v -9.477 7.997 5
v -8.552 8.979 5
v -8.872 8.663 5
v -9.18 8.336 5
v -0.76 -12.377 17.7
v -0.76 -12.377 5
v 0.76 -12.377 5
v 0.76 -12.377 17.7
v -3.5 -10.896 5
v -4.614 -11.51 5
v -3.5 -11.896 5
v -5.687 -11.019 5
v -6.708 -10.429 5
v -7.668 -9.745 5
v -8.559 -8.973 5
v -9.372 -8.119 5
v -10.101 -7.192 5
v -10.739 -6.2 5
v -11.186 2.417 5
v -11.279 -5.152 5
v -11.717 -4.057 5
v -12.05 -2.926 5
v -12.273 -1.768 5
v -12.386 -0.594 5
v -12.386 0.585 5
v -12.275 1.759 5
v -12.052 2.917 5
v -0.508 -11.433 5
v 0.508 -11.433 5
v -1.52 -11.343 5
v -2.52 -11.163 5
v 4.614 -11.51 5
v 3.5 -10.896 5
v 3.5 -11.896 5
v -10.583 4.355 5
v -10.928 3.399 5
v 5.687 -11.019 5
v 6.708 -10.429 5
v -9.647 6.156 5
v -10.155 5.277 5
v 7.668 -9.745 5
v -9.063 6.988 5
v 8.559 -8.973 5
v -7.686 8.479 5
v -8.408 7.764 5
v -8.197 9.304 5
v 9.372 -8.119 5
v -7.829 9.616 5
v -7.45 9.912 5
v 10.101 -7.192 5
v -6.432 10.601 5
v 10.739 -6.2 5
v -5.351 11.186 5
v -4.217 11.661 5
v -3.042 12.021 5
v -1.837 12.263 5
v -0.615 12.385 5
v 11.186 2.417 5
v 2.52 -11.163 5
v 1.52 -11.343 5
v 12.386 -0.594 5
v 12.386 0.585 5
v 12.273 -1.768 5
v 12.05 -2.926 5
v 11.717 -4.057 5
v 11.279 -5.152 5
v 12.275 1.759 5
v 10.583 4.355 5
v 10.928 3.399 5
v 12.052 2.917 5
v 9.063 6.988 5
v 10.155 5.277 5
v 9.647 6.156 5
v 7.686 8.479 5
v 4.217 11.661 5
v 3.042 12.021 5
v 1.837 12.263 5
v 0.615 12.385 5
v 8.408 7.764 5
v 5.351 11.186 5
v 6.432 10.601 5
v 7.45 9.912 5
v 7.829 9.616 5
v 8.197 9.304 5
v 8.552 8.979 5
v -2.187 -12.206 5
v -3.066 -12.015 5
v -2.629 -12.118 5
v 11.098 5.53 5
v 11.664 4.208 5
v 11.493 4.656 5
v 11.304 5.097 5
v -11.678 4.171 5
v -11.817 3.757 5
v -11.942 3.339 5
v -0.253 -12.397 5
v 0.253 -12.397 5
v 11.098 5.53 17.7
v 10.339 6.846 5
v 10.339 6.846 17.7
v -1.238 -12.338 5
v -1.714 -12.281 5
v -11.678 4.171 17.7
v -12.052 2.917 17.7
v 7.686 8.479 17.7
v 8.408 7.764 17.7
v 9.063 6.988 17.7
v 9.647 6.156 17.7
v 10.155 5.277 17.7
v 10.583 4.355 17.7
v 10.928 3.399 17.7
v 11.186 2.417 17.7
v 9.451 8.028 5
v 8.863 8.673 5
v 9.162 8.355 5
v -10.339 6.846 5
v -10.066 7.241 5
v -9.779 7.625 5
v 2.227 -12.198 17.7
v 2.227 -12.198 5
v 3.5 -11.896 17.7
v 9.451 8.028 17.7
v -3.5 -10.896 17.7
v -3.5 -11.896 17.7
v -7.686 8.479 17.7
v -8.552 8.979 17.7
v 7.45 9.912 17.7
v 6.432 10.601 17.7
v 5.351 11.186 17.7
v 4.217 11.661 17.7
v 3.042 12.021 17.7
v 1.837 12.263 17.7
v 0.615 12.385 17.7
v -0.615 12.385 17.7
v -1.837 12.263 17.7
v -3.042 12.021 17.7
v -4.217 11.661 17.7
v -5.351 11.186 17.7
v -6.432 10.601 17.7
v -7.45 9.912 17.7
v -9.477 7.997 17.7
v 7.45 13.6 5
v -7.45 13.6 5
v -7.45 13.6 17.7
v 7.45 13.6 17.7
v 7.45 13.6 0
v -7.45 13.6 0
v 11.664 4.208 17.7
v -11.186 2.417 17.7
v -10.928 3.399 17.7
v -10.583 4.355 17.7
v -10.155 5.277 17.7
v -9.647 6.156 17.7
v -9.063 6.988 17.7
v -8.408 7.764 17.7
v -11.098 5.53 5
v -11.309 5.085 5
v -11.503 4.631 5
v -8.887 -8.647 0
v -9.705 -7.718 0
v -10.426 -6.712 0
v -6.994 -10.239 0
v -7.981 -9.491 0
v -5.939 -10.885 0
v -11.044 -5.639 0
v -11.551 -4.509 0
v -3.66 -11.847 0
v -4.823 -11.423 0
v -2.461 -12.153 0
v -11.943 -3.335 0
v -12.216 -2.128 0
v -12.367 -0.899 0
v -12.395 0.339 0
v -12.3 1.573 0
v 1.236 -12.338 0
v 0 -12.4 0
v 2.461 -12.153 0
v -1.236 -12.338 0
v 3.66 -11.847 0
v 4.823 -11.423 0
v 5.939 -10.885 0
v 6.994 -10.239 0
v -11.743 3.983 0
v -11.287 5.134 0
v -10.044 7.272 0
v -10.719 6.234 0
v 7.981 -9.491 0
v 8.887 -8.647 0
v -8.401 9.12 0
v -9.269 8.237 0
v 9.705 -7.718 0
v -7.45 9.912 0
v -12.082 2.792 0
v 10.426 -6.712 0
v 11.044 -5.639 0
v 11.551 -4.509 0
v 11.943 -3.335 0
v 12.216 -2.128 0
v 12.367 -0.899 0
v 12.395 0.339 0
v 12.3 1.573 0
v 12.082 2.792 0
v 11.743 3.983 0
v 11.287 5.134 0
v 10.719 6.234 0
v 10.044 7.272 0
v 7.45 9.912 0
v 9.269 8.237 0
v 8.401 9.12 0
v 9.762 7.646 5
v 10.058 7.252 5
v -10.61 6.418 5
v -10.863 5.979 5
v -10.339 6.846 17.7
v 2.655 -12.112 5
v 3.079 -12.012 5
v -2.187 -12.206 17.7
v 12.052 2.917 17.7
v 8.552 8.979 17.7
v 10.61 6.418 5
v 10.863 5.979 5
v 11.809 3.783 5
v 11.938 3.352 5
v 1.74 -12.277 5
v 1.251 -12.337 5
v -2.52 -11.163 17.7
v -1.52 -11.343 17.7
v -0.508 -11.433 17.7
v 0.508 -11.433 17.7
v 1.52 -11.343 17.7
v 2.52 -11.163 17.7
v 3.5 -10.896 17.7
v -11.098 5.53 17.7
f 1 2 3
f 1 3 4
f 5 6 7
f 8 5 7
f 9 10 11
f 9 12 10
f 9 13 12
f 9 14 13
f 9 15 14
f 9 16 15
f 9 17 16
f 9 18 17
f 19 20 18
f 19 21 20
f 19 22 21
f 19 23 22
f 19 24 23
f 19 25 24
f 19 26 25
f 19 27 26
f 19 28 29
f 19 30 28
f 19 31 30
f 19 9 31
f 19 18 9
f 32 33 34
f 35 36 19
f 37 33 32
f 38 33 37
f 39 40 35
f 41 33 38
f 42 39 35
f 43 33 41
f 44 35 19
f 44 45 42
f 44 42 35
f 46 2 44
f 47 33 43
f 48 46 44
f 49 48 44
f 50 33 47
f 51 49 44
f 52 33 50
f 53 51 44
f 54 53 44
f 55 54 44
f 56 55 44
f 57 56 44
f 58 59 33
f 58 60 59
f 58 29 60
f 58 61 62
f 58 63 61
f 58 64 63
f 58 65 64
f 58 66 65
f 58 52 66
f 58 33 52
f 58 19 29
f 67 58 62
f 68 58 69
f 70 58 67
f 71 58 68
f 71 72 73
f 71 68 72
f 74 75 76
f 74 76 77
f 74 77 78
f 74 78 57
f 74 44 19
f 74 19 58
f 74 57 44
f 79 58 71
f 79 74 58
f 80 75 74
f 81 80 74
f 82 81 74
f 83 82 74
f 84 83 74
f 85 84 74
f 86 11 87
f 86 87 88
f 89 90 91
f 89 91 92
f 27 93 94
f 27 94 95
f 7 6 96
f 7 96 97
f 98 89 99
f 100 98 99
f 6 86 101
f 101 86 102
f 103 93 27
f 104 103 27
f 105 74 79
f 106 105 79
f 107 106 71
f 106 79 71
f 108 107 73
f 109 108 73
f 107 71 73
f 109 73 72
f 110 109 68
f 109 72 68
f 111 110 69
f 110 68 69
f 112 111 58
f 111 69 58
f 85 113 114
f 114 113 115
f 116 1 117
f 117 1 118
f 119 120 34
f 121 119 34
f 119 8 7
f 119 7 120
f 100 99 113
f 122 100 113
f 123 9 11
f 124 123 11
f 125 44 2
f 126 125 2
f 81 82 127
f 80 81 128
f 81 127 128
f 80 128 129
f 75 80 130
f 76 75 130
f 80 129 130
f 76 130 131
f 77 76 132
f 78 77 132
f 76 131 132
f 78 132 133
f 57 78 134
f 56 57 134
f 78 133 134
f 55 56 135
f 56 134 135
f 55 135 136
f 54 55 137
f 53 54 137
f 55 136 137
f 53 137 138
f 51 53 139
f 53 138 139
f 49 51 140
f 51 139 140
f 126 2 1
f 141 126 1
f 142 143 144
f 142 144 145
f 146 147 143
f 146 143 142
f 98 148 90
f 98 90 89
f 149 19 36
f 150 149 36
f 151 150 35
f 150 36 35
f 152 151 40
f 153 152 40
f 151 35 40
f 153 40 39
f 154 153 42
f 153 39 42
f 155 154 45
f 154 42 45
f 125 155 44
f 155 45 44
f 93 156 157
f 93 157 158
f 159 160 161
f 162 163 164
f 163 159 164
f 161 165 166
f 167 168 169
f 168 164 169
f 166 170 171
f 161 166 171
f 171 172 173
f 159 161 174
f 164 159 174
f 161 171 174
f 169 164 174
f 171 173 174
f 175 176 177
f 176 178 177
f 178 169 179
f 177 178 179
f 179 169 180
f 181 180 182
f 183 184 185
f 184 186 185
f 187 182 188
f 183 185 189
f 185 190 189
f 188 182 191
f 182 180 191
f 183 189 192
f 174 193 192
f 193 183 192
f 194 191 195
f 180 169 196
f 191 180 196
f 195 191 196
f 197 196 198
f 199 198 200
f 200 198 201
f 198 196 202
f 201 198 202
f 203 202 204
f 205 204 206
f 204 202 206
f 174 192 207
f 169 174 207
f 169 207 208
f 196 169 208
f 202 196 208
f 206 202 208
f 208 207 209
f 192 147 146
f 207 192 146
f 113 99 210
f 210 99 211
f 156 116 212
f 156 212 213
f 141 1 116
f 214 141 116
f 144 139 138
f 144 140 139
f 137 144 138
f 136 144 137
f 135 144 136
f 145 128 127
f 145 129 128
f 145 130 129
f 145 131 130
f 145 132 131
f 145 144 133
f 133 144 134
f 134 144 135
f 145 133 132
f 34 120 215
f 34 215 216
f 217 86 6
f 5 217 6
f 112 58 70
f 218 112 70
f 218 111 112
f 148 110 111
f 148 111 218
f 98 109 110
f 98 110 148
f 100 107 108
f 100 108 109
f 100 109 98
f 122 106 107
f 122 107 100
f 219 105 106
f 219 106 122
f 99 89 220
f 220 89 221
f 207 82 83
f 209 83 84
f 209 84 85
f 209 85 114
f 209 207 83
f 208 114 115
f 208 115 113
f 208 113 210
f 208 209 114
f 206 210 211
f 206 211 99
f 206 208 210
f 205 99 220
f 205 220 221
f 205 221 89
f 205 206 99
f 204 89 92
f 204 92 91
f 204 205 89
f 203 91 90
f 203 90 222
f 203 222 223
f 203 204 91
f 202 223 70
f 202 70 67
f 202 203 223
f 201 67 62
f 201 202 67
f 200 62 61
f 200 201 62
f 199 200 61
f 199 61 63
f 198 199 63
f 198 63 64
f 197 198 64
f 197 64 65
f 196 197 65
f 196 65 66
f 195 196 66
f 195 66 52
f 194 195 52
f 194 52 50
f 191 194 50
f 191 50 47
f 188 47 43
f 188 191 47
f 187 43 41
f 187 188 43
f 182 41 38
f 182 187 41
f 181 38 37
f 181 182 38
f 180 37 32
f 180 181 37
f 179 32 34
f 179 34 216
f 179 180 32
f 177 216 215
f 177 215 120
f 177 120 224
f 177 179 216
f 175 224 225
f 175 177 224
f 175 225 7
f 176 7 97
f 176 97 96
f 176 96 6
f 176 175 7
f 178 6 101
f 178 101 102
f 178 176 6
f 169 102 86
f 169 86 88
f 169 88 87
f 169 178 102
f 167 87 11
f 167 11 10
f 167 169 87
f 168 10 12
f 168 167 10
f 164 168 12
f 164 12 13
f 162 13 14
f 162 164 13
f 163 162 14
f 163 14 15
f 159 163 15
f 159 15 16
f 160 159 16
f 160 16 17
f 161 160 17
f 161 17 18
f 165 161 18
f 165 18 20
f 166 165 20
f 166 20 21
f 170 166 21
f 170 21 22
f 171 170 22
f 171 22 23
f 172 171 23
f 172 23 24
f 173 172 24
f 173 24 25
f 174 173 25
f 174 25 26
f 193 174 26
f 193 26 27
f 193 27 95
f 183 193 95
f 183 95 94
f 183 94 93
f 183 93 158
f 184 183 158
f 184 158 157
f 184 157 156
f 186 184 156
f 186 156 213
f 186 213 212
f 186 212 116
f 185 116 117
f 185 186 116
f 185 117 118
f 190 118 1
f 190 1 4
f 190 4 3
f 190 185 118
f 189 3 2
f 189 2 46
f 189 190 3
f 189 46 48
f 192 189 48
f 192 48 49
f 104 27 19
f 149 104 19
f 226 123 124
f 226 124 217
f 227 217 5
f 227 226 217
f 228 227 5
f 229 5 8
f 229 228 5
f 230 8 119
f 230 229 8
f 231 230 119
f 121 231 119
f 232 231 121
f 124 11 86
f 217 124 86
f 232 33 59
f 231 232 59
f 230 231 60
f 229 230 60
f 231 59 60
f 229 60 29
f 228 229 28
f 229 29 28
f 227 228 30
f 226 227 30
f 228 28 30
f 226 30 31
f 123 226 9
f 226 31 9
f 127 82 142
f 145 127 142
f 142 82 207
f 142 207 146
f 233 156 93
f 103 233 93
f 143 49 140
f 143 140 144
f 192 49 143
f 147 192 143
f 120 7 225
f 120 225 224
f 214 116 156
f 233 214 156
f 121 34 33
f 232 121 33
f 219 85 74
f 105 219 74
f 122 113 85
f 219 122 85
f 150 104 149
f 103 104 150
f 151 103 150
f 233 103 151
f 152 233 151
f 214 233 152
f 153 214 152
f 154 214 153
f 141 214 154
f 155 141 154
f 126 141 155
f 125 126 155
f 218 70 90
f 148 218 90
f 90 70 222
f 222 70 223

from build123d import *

# Parameters (mm, degrees)
SKETCH2_W              = 26.816018719
SKETCH2_H              = 28.301670726
SQUARE_EXTRUDE_DEPTH   = 5
ACTUAL_SHAPE_CUT_DEPTH = 5
SKETCH3_W              = 14.9
SKETCH3_H              = 3.687507881
STOPPERS_EXTRUDE_DEPTH = 12.7
CURVE_CUT_DEPTH        = 12.7


with BuildPart() as part:
    # Sketch2 → Square extrude (new body)
    with BuildSketch(Plane.XY):
        with Locations((0.074282601, 0.767135851)):
            Rectangle(SKETCH2_W, SKETCH2_H)
    extrude(amount=SQUARE_EXTRUDE_DEPTH)

    # Sketch1 → Actual shape cut (cut)
    with BuildSketch(Plane.XY):
        with BuildLine():
            Line((-17.45, 14.04483891), (-17.45, 23.6))
            Line((-17.45, 23.6), (17.45, 23.6))
            Line((17.45, 23.6), (17.45, 14.04483891))
            ThreePointArc((17.45, 14.04483891), (0, -22.4), (-17.45, 14.04483891))
        make_face()
        with BuildLine():
            Line((-7.45, 9.912492119), (-7.45, 13.6))
            Line((-7.45, 13.6), (7.45, 13.6))
            Line((7.45, 13.6), (7.45, 9.912492119))
            ThreePointArc((7.45, 9.912492119), (0, -12.4), (-7.45, 9.912492119))
        make_face(mode=Mode.SUBTRACT)
    extrude(amount=ACTUAL_SHAPE_CUT_DEPTH, mode=Mode.SUBTRACT)

    # Sketch3 → Stoppers extrude (add)
    with BuildSketch(Plane.XY.offset(5)):
        with Locations((0, 11.75624606)):
            Rectangle(SKETCH3_W, SKETCH3_H)
        with BuildLine():
            Line((3.5, -11.895797577), (3.5, -10.895797577))
            ThreePointArc((3.5, -10.895797577), (0, -11.444142818), (-3.5, -10.895797577))
            Line((-3.5, -10.895797577), (-3.5, -11.895797577))
            Line((-3.5, -11.895797577), (-2.187402084, -12.20554268))
            Line((-2.187402084, -12.20554268), (-0.759747946, -12.376703239))
            Line((-0.759747946, -12.376703239), (0.759747946, -12.376703239))
            Line((0.759747946, -12.376703239), (2.226876894, -12.198402326))
            Line((2.226876894, -12.198402326), (3.5, -11.895797577))
        make_face()
        with BuildLine():
            Line((-12.0520629, 2.916809875), (-11.186037496, 2.416809875))
            ThreePointArc((-11.186037496, 2.416809875), (-9.910918405, 5.722071409), (-7.686037496, 8.478987702))
            Line((-7.686037496, 8.478987702), (-8.5520629, 8.978987702))
            Line((-8.5520629, 8.978987702), (-9.476608986, 7.997117113))
            Line((-9.476608986, 7.997117113), (-10.338665447, 6.846312641))
            Line((-10.338665447, 6.846312641), (-11.098413393, 5.530390597))
            Line((-11.098413393, 5.530390597), (-11.677564746, 4.170669202))
            Line((-11.677564746, 4.170669202), (-12.0520629, 2.916809875))
        make_face()
        with BuildLine():
            Line((8.5520629, 8.978987702), (7.686037496, 8.478987702))
            ThreePointArc((7.686037496, 8.478987702), (9.910918405, 5.722071409), (11.186037496, 2.416809875))
            Line((11.186037496, 2.416809875), (12.0520629, 2.916809875))
            Line((12.0520629, 2.916809875), (11.66401107, 4.208425567))
            Line((11.66401107, 4.208425567), (11.098413393, 5.530390597))
            Line((11.098413393, 5.530390597), (10.338665447, 6.846312641))
            Line((10.338665447, 6.846312641), (9.450687853, 8.027733124))
            Line((9.450687853, 8.027733124), (8.5520629, 8.978987702))
        make_face()
    extrude(amount=STOPPERS_EXTRUDE_DEPTH)

    # Sketch4 → Curve cut (cut)
    with BuildSketch(Plane.XY.offset(17.7)):
        with BuildLine():
            Line((-7.45, 9.912492119), (7.45, 9.912492119))
            ThreePointArc((7.45, 9.912492119), (0, 12.4), (-7.45, 9.912492119))
        make_face()
    extrude(amount=-CURVE_CUT_DEPTH, mode=Mode.SUBTRACT)


solid = part.part
